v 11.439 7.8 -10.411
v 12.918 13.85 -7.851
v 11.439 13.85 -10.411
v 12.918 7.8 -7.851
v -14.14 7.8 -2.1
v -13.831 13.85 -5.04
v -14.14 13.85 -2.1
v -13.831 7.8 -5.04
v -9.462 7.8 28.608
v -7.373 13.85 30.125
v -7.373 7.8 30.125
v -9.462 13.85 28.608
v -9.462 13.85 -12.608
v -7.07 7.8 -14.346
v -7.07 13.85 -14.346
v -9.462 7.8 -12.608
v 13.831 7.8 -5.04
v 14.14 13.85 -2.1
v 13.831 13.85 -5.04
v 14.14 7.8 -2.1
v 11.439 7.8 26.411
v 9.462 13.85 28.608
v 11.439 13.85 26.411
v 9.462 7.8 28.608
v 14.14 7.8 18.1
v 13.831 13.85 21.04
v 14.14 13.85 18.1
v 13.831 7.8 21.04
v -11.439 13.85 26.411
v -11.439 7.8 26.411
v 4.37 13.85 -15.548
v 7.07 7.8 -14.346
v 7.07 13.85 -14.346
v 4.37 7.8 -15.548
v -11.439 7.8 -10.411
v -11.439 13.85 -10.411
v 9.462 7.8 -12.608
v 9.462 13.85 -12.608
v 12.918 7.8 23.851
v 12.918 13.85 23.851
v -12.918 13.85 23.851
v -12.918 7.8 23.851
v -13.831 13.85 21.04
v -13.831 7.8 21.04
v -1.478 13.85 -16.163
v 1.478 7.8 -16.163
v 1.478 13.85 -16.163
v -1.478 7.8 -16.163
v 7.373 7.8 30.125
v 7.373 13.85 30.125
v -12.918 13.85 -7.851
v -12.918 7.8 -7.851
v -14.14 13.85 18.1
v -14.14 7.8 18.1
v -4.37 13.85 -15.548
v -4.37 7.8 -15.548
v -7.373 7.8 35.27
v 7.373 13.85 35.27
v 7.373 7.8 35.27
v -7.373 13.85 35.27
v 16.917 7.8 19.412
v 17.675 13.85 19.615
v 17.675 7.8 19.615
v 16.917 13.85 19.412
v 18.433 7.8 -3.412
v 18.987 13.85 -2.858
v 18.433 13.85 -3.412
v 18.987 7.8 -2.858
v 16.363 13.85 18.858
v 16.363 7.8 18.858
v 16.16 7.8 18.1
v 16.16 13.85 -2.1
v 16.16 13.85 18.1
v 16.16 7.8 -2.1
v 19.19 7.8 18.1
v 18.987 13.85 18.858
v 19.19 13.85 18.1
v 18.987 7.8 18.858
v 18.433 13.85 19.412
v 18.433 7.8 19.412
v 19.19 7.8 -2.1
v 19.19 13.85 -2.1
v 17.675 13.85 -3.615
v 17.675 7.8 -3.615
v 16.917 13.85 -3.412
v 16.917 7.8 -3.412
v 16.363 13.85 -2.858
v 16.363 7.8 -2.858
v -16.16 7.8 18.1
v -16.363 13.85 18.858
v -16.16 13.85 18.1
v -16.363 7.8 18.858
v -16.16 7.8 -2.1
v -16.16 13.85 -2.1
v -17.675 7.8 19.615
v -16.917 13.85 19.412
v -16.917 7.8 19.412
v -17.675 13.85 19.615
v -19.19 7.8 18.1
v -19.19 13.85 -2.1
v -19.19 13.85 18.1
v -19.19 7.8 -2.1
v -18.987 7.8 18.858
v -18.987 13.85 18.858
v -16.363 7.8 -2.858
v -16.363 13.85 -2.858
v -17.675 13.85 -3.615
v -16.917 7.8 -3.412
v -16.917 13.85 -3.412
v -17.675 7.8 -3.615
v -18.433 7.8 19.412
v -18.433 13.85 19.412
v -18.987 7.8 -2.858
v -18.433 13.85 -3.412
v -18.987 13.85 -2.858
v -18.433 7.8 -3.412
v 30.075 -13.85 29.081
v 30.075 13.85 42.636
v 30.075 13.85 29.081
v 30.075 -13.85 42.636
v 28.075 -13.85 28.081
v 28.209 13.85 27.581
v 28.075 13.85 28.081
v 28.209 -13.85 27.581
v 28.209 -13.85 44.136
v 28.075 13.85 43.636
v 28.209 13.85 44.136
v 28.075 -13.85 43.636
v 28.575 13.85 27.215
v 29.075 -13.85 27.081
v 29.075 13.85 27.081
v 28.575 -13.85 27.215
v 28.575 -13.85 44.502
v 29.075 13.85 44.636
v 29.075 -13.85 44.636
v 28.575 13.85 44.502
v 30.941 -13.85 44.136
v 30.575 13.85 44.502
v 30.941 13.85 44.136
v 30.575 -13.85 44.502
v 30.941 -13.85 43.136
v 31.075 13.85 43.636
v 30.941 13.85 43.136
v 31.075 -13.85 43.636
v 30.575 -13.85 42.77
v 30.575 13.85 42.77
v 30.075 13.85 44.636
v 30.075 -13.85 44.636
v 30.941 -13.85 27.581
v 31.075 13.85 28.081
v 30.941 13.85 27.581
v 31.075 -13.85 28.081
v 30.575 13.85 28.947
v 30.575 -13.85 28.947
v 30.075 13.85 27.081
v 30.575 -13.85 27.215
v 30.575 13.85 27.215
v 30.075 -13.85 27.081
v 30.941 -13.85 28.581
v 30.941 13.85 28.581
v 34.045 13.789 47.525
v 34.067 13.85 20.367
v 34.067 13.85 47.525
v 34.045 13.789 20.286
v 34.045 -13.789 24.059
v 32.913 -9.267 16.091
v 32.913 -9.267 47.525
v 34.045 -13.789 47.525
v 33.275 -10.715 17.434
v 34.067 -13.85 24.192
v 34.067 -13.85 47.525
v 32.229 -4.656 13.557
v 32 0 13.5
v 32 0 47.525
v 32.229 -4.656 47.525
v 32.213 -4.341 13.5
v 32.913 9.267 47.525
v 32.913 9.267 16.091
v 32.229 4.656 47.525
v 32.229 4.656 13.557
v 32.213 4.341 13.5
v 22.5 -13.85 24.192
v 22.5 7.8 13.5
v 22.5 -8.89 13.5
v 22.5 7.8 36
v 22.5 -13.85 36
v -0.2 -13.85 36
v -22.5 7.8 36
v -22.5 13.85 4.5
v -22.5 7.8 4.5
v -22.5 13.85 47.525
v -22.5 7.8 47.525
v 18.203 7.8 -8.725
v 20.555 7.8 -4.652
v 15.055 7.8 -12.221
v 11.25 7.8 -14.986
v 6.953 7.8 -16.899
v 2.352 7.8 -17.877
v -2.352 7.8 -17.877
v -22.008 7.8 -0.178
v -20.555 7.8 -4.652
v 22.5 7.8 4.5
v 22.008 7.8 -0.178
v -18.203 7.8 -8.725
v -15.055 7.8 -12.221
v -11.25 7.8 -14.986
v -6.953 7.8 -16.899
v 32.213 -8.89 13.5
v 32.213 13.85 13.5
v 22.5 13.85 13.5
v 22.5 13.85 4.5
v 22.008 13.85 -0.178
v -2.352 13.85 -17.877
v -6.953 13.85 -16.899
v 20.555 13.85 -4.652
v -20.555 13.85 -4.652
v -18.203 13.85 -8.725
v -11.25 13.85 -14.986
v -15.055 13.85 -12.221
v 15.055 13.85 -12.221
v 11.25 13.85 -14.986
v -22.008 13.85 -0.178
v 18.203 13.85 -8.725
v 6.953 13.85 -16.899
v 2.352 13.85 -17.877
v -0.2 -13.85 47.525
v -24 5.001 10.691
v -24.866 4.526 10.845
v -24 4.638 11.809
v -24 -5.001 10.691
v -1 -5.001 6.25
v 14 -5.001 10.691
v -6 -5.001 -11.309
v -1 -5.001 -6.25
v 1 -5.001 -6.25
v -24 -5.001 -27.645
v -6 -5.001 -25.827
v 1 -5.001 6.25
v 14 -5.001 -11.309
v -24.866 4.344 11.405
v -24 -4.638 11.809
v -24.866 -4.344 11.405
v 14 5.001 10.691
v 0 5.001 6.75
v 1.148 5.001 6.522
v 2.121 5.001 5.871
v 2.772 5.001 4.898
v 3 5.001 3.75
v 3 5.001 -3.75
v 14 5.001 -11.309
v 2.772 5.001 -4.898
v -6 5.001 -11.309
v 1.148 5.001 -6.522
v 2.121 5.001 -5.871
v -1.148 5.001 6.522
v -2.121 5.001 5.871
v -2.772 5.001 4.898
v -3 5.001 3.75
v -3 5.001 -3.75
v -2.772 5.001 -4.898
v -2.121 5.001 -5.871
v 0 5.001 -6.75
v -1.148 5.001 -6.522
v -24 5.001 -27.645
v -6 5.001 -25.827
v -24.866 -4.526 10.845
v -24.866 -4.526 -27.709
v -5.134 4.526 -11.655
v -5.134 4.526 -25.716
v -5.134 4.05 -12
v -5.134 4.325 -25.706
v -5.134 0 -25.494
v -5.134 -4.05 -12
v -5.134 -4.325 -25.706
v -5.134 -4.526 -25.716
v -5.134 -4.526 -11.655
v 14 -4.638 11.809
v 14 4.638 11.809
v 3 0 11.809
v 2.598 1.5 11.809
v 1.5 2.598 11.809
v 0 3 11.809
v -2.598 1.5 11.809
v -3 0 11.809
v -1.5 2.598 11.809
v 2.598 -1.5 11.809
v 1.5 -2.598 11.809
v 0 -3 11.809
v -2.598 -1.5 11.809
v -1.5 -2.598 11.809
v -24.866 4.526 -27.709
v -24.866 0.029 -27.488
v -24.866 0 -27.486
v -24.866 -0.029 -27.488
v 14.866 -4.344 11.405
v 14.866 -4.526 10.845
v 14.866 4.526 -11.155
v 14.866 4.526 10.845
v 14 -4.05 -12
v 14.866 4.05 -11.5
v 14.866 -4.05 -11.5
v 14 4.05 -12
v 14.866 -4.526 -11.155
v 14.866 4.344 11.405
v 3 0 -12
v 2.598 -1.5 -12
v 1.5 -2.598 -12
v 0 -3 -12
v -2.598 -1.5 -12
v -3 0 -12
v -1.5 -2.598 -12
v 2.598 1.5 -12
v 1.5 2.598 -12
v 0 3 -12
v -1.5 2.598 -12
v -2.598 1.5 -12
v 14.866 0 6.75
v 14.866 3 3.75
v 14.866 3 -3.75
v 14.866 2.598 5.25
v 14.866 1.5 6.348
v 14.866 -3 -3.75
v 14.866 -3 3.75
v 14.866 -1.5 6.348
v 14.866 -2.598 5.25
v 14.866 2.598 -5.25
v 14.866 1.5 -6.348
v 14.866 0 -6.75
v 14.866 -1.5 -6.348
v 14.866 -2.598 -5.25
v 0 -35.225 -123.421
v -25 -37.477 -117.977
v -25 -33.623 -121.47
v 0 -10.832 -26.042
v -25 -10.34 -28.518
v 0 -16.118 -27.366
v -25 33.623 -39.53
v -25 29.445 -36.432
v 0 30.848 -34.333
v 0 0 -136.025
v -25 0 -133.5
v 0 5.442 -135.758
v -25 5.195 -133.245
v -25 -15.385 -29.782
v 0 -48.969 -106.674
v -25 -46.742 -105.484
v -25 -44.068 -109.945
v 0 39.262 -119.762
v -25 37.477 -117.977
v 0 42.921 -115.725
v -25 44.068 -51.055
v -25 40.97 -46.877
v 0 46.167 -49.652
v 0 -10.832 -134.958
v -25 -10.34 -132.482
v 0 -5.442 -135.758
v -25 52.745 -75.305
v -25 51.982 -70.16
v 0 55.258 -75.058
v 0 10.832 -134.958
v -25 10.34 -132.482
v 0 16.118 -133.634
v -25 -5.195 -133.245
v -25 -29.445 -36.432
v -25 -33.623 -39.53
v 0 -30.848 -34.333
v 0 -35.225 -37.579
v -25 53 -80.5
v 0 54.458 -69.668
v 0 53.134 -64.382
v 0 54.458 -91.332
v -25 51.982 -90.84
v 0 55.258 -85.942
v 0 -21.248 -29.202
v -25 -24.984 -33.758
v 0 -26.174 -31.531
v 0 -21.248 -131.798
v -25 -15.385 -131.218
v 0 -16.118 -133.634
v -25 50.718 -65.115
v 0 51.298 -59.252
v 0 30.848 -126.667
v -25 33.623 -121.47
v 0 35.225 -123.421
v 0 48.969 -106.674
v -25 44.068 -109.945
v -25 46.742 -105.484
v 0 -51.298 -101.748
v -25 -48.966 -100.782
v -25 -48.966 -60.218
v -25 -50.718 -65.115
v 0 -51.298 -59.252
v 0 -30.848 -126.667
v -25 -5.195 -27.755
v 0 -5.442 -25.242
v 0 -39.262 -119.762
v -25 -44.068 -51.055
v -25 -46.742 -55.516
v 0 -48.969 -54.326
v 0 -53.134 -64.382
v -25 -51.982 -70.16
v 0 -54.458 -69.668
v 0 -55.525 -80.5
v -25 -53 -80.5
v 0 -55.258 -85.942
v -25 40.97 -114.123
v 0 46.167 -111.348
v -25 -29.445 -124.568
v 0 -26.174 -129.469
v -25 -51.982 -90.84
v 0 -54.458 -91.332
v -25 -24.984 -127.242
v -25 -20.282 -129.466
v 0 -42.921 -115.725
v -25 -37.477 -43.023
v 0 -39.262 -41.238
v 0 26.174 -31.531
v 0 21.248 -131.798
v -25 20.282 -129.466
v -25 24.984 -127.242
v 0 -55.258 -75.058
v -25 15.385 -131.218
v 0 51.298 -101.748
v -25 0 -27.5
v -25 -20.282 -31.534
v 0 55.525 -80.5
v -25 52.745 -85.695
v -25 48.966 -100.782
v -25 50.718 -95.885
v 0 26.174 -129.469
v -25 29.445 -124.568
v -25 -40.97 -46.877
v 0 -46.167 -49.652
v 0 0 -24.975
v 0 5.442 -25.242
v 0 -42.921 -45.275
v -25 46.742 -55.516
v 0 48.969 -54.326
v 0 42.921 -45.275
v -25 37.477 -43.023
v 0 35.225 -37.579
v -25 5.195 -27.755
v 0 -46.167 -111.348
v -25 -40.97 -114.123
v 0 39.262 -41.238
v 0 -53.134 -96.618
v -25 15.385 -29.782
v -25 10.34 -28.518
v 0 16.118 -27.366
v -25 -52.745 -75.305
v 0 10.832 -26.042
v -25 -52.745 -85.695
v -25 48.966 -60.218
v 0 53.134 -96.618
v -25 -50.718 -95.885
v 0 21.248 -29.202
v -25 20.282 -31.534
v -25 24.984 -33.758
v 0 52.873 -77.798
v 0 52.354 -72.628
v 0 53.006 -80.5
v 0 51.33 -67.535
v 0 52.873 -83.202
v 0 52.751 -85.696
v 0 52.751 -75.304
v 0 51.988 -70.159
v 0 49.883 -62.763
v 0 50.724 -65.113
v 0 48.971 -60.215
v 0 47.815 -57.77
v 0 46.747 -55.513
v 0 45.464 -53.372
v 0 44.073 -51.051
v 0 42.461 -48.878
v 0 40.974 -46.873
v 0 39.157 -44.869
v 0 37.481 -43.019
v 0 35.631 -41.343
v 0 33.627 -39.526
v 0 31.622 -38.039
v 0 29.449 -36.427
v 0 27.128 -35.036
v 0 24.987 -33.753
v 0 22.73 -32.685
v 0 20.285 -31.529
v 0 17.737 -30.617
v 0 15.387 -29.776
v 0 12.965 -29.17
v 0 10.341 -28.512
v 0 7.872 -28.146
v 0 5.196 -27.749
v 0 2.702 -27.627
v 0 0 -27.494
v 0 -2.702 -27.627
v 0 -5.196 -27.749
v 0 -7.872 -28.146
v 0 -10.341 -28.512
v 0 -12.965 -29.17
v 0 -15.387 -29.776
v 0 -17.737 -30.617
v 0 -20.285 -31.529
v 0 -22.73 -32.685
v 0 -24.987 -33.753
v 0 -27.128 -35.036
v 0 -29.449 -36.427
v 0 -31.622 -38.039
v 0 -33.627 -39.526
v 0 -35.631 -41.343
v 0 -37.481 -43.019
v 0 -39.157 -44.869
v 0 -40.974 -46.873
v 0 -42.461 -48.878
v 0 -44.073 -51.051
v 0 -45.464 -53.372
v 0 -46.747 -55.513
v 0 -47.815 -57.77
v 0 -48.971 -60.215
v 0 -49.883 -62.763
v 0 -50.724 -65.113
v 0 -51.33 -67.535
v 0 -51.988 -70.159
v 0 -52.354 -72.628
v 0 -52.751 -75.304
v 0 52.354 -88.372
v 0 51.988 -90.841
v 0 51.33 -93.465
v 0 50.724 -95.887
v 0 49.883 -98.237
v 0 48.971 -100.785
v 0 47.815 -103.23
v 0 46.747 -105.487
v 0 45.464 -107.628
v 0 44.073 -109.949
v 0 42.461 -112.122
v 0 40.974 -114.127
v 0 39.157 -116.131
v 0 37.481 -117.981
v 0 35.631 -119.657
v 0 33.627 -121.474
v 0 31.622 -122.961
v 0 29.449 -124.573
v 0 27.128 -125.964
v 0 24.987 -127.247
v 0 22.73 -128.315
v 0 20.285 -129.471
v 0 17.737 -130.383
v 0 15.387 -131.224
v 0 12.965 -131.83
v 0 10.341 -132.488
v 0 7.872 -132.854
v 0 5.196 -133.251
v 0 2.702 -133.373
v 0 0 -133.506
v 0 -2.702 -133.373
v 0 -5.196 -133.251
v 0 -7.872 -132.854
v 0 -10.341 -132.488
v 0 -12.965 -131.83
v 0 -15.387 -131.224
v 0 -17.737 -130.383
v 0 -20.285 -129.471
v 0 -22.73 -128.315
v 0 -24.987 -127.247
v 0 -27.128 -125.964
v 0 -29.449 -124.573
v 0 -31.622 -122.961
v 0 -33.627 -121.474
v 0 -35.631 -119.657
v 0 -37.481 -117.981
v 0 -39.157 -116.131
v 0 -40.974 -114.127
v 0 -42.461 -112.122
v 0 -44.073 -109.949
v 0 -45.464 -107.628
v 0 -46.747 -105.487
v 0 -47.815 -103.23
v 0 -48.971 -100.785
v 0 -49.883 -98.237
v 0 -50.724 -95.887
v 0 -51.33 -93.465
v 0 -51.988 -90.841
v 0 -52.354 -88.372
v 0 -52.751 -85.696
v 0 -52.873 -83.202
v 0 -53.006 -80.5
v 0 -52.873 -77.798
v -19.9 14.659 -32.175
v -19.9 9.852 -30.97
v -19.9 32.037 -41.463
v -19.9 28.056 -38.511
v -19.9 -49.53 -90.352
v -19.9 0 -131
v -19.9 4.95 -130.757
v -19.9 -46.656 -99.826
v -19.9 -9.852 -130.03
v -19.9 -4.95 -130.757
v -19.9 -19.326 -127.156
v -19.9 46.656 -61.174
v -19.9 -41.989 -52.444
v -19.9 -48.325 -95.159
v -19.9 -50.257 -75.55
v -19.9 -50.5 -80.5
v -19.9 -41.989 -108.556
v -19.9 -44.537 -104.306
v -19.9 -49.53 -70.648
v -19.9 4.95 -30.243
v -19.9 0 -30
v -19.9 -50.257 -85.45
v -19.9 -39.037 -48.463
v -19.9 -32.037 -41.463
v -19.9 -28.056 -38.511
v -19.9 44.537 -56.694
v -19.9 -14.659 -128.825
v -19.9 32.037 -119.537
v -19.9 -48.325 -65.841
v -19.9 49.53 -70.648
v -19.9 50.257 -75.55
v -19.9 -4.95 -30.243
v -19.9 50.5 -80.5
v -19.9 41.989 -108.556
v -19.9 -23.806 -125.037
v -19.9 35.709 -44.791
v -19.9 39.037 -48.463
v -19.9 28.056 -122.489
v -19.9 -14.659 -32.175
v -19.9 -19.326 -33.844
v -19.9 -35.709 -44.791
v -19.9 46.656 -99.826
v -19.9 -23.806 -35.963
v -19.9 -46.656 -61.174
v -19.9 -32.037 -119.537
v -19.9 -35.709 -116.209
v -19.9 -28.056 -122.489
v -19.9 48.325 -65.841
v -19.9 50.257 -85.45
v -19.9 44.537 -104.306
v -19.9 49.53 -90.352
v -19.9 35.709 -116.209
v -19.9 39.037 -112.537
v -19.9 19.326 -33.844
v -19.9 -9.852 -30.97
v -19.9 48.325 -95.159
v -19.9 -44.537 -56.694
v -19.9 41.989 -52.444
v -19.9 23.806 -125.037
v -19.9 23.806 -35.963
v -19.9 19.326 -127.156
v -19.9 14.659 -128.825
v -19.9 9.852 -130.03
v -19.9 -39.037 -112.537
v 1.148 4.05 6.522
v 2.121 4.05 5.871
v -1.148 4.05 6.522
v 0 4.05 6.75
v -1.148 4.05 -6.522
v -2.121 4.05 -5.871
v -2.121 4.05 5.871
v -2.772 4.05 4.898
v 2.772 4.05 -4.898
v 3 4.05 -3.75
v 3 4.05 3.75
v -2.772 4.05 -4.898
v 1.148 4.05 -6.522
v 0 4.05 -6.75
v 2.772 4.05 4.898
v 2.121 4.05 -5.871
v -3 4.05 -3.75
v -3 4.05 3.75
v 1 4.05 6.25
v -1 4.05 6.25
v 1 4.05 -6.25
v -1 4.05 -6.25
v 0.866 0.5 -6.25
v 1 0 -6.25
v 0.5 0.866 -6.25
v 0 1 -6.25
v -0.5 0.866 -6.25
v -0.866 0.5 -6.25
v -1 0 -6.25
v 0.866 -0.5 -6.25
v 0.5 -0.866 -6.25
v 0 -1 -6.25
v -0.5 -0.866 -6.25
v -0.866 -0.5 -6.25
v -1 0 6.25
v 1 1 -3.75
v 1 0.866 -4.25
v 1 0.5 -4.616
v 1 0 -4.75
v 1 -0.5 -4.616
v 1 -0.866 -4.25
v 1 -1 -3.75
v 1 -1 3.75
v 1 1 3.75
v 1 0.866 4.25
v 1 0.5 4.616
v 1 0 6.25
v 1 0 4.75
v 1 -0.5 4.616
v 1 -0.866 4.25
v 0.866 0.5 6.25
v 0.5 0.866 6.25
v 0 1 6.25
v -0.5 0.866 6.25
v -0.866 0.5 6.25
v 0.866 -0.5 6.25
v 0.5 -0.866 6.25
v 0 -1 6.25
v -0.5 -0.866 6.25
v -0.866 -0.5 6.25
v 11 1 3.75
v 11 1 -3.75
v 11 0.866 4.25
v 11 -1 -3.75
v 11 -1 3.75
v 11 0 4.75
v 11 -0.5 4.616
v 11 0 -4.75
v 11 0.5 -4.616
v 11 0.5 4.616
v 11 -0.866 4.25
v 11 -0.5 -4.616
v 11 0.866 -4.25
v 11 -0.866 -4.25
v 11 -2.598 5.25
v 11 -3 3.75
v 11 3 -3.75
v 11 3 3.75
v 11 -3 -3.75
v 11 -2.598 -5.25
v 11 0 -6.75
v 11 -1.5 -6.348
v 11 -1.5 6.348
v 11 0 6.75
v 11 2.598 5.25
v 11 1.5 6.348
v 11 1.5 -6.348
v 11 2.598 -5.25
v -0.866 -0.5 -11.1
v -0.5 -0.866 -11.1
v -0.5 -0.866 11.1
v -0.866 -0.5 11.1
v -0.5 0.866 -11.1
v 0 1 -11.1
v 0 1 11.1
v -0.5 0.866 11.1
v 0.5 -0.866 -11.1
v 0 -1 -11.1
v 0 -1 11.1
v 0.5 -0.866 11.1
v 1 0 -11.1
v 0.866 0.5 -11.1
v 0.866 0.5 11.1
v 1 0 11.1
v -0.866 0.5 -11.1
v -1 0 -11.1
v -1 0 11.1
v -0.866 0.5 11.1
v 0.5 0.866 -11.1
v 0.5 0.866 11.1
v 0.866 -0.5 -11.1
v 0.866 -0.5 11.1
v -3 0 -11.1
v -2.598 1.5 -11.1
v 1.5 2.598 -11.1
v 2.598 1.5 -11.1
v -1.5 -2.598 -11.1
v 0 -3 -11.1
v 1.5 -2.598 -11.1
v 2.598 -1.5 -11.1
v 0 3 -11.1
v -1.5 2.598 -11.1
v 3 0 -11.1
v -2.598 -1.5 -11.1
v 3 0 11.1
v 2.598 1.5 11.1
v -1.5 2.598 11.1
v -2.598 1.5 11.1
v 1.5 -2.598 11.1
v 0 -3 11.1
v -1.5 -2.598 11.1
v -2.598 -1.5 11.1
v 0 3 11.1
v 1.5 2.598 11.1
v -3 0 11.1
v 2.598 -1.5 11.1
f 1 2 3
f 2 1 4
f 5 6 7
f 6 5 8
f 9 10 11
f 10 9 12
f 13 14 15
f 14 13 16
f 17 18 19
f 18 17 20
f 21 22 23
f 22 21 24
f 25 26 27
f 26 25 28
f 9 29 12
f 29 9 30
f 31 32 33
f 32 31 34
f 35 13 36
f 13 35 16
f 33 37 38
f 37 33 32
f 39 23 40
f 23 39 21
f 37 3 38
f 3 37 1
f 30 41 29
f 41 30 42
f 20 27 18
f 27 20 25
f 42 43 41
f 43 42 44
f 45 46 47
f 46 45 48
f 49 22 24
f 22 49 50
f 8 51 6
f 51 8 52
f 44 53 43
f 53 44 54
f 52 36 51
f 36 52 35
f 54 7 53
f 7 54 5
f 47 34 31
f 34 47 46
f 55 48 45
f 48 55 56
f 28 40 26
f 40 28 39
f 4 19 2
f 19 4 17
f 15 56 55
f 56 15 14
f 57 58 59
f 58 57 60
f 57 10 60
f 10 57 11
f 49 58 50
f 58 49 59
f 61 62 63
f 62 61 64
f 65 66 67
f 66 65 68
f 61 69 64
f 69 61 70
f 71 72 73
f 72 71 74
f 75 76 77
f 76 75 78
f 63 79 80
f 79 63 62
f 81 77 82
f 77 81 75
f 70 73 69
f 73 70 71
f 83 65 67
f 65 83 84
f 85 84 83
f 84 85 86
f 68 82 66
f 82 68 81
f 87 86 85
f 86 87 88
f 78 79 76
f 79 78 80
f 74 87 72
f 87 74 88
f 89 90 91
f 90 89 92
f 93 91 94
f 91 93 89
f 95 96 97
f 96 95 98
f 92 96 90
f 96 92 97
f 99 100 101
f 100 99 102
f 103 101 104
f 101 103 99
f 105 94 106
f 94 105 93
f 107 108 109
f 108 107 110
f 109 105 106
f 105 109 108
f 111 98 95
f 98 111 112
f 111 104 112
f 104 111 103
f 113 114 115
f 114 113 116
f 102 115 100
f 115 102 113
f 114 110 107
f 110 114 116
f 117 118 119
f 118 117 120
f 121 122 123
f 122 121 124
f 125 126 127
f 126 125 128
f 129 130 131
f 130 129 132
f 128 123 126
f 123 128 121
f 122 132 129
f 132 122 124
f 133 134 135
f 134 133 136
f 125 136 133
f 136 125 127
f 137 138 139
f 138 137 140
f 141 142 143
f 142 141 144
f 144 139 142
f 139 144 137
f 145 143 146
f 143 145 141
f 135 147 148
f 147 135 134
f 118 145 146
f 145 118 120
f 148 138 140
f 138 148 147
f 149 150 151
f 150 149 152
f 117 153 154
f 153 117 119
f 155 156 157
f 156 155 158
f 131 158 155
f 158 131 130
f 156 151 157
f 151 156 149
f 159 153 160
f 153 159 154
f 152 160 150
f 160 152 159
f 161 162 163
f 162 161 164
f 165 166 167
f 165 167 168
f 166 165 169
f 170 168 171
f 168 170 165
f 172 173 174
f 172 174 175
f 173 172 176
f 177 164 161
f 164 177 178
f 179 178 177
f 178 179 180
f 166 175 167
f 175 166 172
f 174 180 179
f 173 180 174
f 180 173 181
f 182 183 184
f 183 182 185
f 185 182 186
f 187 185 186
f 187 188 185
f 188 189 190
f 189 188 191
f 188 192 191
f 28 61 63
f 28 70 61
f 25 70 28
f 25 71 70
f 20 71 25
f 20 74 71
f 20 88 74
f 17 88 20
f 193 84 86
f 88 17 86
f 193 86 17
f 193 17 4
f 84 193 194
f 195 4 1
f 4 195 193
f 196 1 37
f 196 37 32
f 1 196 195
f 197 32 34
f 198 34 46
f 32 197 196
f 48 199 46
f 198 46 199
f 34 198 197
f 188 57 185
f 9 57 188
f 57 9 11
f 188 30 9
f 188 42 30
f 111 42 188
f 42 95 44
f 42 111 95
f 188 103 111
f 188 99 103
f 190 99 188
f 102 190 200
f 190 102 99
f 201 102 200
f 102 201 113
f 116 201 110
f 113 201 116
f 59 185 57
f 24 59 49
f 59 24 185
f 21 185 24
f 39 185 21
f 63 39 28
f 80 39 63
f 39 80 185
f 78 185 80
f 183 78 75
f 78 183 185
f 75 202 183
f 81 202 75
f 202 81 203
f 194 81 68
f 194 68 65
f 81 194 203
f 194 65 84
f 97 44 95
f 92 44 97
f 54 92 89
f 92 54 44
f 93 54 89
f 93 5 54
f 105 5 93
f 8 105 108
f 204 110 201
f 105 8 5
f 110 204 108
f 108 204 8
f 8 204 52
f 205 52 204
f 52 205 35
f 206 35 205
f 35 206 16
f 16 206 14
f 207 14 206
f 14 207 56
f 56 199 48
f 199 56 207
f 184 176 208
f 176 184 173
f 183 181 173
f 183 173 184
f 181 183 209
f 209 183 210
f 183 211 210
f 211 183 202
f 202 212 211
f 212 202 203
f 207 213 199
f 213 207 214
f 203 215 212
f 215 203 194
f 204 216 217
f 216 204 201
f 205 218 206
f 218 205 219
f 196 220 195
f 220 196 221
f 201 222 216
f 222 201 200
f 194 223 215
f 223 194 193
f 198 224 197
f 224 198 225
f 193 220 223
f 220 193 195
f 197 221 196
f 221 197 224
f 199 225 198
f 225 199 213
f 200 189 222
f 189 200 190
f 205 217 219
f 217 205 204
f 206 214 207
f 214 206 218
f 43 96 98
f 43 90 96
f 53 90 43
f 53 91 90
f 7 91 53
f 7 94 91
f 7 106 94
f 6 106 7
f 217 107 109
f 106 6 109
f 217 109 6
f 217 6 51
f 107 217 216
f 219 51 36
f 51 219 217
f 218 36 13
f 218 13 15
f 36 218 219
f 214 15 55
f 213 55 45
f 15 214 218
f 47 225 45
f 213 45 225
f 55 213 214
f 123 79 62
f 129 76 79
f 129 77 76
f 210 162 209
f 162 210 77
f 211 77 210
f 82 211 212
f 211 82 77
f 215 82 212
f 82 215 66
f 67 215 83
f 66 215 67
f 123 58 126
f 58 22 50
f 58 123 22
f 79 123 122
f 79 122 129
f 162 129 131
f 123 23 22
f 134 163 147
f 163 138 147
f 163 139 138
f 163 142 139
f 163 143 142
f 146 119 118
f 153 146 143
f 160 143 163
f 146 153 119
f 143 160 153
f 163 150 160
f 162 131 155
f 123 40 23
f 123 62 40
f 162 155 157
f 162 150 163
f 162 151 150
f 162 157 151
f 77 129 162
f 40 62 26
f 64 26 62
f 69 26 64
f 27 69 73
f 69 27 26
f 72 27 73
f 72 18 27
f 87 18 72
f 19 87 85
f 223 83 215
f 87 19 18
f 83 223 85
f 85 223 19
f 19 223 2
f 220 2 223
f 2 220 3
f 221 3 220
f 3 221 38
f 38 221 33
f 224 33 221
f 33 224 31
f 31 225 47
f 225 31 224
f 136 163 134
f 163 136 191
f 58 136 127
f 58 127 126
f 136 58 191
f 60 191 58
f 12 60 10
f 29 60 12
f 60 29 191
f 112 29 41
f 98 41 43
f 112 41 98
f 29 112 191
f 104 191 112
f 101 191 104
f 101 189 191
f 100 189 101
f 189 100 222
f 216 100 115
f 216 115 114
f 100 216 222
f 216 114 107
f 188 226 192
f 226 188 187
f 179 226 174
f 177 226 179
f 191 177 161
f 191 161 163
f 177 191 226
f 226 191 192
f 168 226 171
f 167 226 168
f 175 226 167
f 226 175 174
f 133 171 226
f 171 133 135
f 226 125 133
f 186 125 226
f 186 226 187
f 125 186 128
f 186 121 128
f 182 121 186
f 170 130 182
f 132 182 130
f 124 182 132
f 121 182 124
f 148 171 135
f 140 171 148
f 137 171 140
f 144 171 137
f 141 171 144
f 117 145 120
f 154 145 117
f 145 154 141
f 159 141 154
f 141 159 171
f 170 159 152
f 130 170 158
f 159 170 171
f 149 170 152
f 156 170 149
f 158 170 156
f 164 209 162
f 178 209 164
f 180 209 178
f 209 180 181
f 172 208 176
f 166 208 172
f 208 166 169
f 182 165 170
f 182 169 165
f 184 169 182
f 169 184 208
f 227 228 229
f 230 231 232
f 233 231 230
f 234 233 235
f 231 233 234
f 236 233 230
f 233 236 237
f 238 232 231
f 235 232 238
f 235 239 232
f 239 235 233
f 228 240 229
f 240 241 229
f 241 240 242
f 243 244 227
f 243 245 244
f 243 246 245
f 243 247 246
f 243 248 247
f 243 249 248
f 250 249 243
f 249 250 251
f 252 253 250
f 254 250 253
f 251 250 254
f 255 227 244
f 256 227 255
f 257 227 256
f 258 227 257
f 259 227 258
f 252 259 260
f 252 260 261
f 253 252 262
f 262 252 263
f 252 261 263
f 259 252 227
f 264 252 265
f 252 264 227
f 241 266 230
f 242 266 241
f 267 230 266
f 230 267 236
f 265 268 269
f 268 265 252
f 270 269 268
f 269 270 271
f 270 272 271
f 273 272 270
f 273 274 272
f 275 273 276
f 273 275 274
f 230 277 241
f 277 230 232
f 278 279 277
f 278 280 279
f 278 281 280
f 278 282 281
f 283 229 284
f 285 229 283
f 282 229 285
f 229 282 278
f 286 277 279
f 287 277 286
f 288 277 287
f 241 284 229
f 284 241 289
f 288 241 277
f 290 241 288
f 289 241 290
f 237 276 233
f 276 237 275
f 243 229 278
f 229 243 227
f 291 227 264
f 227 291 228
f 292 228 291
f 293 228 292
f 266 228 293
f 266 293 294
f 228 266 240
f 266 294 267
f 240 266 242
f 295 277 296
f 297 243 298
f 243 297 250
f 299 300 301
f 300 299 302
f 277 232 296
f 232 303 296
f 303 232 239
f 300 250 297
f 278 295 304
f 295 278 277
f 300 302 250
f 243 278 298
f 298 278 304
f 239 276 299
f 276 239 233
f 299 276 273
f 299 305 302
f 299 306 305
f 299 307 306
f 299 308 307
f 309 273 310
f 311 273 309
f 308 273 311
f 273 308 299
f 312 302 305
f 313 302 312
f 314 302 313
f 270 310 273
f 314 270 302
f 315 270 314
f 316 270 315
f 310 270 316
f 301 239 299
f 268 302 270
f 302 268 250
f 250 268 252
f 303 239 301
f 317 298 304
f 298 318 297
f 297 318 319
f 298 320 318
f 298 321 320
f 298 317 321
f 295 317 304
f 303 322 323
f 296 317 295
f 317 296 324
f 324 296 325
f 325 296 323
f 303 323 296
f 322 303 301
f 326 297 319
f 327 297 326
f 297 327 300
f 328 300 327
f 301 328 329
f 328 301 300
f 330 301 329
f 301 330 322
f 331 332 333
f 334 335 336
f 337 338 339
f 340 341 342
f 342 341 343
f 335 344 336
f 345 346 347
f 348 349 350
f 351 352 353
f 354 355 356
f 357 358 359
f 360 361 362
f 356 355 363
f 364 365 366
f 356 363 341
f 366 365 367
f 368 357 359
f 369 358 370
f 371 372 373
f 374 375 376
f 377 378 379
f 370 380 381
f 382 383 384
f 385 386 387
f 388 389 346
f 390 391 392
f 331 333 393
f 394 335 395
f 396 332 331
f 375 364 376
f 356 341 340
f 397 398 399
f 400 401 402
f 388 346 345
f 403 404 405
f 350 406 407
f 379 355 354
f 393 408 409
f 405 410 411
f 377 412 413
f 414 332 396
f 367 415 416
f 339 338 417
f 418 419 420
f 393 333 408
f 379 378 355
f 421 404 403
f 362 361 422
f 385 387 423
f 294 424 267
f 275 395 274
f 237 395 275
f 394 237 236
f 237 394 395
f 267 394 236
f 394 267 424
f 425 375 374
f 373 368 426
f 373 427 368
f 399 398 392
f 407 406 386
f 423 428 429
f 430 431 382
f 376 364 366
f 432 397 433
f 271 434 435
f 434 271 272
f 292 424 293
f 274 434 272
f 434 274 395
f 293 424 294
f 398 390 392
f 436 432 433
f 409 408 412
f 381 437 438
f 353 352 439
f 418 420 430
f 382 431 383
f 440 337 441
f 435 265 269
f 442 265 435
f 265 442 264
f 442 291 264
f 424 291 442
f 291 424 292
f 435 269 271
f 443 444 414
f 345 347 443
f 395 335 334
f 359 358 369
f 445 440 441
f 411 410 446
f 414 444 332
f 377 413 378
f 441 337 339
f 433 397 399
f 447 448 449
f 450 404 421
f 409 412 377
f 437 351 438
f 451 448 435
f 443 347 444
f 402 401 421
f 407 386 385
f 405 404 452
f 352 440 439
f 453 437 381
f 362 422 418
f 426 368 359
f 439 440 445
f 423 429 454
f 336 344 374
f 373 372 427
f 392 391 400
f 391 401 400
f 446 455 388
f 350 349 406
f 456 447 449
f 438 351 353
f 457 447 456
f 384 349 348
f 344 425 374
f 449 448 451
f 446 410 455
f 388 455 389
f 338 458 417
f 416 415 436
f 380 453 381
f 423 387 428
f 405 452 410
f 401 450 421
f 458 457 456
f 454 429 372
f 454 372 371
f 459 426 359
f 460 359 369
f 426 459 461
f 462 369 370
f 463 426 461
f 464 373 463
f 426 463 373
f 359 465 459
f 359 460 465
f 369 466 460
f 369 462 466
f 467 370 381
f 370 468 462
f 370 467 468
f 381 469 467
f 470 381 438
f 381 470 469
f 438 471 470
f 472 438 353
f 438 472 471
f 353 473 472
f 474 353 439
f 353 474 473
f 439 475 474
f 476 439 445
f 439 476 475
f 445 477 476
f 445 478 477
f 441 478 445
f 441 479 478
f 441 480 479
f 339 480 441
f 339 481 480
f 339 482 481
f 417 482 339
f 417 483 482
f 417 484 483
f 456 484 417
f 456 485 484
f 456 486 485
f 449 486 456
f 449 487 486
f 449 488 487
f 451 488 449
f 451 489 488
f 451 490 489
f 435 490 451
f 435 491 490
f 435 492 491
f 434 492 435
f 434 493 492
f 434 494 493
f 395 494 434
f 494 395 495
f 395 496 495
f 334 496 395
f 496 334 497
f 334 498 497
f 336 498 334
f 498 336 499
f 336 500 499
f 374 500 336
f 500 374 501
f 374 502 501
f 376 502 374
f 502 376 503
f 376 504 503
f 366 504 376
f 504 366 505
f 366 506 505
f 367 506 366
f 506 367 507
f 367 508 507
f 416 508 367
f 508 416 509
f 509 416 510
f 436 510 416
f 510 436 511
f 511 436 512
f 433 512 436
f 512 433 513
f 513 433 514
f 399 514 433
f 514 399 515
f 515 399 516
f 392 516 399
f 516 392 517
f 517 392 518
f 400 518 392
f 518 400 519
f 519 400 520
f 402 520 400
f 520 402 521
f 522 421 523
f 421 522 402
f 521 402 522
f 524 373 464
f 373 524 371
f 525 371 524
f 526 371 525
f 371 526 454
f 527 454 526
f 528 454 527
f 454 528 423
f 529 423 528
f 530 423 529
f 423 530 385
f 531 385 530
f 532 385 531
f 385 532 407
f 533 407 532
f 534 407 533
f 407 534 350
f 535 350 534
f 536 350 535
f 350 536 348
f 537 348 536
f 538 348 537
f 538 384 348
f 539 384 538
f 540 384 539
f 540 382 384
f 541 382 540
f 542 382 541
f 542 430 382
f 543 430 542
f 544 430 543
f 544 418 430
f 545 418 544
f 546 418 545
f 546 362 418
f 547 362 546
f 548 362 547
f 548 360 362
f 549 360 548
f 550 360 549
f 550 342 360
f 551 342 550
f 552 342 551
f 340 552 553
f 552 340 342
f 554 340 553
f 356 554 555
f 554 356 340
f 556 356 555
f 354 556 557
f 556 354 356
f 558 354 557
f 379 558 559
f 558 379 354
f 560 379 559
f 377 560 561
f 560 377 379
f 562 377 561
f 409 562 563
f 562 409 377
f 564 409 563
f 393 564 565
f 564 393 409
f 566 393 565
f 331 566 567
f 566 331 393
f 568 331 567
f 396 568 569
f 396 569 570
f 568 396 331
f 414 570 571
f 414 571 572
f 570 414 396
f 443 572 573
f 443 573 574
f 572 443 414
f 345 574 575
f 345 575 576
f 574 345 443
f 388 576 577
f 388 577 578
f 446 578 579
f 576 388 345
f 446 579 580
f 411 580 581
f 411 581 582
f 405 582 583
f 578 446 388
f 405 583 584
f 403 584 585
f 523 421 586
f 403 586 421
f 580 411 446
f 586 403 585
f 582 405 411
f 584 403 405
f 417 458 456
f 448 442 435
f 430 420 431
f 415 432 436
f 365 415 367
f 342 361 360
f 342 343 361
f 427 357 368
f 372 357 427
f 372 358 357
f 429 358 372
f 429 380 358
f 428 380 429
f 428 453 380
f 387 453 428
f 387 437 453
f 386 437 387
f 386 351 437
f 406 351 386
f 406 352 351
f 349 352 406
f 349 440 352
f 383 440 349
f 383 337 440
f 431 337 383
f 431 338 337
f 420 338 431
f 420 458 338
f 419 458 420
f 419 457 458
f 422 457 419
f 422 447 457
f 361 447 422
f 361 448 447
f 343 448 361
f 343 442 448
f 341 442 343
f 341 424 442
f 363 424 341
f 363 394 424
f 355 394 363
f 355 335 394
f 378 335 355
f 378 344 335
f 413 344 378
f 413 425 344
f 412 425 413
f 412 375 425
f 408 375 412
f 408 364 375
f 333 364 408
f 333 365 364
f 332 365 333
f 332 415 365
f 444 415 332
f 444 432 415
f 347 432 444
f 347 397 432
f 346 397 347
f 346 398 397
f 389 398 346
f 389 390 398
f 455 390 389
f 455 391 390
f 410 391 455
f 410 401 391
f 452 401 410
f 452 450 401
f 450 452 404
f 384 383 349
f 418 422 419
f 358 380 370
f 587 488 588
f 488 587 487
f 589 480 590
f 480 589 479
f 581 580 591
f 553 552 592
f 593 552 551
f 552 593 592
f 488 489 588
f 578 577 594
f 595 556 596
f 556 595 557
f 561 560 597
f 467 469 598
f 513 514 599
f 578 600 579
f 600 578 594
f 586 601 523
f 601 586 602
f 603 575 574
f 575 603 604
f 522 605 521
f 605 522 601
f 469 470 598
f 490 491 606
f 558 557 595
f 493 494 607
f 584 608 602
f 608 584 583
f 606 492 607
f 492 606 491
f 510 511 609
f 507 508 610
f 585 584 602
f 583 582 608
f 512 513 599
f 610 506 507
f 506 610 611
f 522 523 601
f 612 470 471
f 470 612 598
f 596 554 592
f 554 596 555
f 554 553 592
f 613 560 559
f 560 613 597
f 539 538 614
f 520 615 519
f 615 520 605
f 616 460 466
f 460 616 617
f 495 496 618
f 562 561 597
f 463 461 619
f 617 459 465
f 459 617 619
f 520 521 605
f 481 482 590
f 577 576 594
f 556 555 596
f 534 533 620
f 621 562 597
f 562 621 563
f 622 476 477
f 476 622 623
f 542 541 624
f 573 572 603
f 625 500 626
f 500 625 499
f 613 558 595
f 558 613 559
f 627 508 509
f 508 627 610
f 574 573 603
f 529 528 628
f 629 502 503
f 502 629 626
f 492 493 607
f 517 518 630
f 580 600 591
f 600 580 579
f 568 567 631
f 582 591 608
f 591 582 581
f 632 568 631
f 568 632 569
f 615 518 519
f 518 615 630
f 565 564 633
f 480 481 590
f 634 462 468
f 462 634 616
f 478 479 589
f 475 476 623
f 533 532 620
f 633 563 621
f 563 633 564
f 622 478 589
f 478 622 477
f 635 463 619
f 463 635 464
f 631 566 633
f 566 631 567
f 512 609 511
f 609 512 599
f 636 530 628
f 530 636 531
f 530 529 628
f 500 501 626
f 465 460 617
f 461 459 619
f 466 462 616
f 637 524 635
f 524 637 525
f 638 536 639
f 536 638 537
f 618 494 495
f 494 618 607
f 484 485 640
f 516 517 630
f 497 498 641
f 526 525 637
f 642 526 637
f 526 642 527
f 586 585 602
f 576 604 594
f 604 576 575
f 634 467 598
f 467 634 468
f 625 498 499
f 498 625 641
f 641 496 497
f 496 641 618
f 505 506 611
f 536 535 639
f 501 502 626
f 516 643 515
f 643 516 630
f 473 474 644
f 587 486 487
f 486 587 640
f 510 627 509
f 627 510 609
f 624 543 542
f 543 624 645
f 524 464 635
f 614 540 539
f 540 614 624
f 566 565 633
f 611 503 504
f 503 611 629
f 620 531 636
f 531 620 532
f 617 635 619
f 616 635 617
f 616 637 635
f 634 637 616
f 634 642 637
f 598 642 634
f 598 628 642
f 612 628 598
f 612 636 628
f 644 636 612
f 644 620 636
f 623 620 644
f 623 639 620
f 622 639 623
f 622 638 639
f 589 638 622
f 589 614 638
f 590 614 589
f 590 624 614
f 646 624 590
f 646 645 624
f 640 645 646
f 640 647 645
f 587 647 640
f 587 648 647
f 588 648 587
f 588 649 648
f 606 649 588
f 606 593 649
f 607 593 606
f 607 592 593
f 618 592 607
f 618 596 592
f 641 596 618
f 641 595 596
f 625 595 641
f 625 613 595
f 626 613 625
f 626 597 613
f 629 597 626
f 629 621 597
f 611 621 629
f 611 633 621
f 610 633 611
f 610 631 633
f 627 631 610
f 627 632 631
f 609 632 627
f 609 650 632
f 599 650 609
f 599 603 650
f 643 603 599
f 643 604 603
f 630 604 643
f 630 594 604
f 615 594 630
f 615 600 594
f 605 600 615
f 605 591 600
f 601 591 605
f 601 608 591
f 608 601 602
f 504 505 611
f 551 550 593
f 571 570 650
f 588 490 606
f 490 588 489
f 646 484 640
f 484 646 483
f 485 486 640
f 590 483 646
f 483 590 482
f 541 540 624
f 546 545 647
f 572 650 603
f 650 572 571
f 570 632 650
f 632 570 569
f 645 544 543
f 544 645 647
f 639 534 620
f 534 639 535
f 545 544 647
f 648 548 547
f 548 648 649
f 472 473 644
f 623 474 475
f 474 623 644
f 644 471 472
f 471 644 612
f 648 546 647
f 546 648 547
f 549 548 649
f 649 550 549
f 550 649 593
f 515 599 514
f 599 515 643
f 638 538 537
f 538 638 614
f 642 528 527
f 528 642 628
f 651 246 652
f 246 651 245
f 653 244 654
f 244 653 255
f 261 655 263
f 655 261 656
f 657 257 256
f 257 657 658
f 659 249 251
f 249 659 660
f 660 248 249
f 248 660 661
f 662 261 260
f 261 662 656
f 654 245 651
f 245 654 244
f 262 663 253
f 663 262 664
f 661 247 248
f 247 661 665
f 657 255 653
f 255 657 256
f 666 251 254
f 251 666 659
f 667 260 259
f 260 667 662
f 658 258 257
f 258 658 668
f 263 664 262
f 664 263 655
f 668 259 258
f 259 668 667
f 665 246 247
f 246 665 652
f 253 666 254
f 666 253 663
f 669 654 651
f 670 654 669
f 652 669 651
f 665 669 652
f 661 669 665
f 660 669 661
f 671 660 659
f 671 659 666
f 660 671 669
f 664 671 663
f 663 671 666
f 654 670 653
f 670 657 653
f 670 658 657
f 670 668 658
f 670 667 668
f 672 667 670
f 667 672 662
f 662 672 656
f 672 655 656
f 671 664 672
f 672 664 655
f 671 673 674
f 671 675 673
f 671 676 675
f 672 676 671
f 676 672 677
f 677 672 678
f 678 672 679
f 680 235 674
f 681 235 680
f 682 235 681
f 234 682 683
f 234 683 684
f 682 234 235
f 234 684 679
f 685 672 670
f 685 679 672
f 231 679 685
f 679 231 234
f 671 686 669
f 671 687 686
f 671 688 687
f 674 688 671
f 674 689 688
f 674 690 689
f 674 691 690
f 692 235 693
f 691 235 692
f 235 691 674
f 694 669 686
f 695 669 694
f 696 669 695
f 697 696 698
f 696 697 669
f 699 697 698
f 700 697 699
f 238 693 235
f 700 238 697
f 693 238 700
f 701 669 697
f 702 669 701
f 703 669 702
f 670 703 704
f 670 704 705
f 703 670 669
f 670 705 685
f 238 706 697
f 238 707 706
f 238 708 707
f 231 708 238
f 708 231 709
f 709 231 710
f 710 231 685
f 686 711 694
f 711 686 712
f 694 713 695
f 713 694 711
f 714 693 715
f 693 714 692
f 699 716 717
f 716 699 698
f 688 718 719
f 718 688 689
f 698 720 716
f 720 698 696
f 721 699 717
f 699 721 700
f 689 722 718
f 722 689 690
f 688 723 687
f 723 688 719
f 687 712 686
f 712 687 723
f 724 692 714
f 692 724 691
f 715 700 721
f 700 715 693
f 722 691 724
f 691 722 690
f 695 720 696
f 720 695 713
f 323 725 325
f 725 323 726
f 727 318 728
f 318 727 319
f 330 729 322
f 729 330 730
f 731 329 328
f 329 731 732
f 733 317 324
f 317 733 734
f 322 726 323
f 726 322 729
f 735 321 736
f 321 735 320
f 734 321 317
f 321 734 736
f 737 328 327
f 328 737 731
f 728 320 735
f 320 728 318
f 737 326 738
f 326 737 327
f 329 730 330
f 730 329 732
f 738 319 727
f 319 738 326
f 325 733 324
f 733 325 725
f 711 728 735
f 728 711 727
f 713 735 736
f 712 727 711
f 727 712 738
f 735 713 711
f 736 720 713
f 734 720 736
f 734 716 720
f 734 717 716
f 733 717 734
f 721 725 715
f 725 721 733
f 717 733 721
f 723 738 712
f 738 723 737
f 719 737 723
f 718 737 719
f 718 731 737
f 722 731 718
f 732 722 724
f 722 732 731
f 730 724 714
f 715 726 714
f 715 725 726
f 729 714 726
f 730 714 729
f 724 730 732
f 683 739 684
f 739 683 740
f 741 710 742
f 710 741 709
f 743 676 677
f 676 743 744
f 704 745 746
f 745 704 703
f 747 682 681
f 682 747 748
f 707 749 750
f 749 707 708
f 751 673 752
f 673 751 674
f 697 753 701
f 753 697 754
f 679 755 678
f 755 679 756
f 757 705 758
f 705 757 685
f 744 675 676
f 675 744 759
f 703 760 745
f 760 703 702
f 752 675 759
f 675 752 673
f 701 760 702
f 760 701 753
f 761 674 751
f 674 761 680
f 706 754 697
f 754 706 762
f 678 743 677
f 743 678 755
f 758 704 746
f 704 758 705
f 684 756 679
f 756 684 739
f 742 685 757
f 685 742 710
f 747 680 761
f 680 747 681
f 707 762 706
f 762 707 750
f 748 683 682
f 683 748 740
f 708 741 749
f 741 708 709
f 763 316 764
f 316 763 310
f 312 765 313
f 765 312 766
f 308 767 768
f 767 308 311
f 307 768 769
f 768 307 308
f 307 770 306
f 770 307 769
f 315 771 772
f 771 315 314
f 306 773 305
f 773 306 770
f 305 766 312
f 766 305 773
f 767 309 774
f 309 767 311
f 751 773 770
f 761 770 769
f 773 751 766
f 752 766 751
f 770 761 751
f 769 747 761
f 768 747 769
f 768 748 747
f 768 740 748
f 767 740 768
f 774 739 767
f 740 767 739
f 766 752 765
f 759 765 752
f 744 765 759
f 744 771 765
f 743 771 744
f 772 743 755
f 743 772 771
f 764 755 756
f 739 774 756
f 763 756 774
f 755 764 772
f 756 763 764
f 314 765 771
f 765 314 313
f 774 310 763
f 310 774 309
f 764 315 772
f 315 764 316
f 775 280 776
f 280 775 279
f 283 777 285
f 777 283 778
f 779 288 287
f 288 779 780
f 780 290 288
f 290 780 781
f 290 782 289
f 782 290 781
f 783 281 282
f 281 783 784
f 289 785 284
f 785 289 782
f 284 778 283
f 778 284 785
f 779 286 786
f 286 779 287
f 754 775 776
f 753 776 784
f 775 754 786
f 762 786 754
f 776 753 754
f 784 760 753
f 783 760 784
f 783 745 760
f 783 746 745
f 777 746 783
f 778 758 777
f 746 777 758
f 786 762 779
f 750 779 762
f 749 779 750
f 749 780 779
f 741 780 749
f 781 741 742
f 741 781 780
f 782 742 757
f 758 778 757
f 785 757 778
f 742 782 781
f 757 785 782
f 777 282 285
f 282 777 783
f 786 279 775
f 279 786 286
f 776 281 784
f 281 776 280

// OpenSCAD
// file: 28byj-48.scad
module body()
{
    union()
    {
        cylinder(h = 19, d = 28, center = [0,0,0]);
        translate([-14.6/2,-17,19-16]) cube([14.6,17,16]);
    }
}

module ear()
{
    translate([-35/2,0,19-0.8/2])
    {
        difference()
        {
            union()
            {
                cylinder(h=0.8, d=7, center=true);
                translate([0,-7/2,-0.8/2])
                {
                    cube([7,7,0.8]);
                }
            }
            cylinder(h=0.8+0.1, d=4.2, center=true);
        }
    }
}

module axis()
{
    translate([0,8,19])
    {
        cylinder(h=1.5, d=9);
        difference()
        {
            cylinder(h=10, d=5);
            #translate([-3,(+5-3)/2,4]) cube([3*2,2,6]);
            #translate([-3,(-5+3)/2-2,4]) cube([3*2,2,6]);
        }
    }
}

module stepper_28BYJ_48()
{
    body();
    ear();
    mirror(v=[-1,0,0]) ear();
    axis();
}

stepper_28BYJ_48();
// main file
// Dust cap system

lens_r=101/2;

use <28byj-48.scad>;
M3_d=3; // 2.5 is printed too narrow
M2_d=1.6*(3/2.5); // 1.6 enlarged in same proportions
M3_Head=2;

module ED80T()
{
    cylinder(d=101,h=20,$fn=64);
    cylinder(d=101-3*2,h=100,$fn=64);
}

module offset_hull(ofs=[0,0,0])
{
    // Works with 1-level deep objects...
    for(c=[0:$children-1])
        hull()
        {
            translate(-ofs) children(c);
            translate( ofs) children(c);
        }
}

module screw_space(head_d,head_h,drill_d,drill_h,hull_ofs=[0,0,0])
{
    offset_hull(hull_ofs)
    {
        cylinder(d=head_d,h=drill_h,$fn=12);
        translate([0,0,drill_h-1])
            cylinder(d=drill_d*2.0,h=head_h,$fn=12);
    }
}

lever_l=30;
module cap_block(R,H,B) union()
{
    bot_h=5;
    lever_w=0+R*0.2;
    lever_drop=0+H;
    m_r=1;
    difference()
    {
        translate([lever_l+R,0,-bot_h-lever_drop]) difference()
        {
            union()
            {
                cylinder(h=H+bot_h,d1=R*2+5,d2=R*2.1+5,$fn=64);
                minkowski()
                {
                    translate([-R-lever_l/2,0,10]) //hull()
                    {
                        cube([lever_l*1.8-m_r*2,lever_w-m_r*2,H-m_r*2],center=true);
                        //translate([0,0,-H/2+5/2])
                        //    cube([lever_l,lever_w*1.5,5],center=true);
                        translate([-lever_l/2,0,H-5])
                            cube([lever_l*0.8-m_r*2,lever_w-m_r*2,H+10-m_r*2],center=true);
                    }
                    sphere(d=m_r*2);
                }
            }
            // Cap emptiness
            translate([0,0,bot_h+0.1]) union()
            {
                cylinder(h=2*H+0.1,d1=R*2,d2=R*2.2,$fn=64);
                /*translate([0,0,H])
                    cylinder(h=H,d=R*2.1);*/
            }
        }
        // Stepper axis
        *rotate([0,180,0]) translate([0,24+M3_Head,-8])
            rotate([90,0,0])
                stepper_28BYJ_48();
        #translate([0,lever_w/2+0,0])
            rotate([90,0,0])
                offset_hull([lever_l/8,0,0])
                {
                    cylinder(d=6,h=1,$fn=16);
                    translate([0,0,lever_w/2])
                        cube([5,2,lever_w],center=true);
                }
        // Screws with space for head and adjustment
        #union()
        {
            screw_space(M3_Head,4,M3_d,H/2+2,[lever_l/8,0,0]);
            rotate([0,90,0]) screw_space(M3_Head,4,M3_d,lever_w+2);
            rotate([0,-90,0]) screw_space(M3_Head,4,M3_d,lever_w+2);
        }
    }
}

module holder(R,H,B)
{
    holder_w=0+R*0.1;
    holder_h=70;
    holder_d=45;
    stepper_ear_h=0.8;
    side_offset=5.5+holder_w/2+M3_Head+stepper_ear_h;
    difference()
    {
        hull()
        {
            translate([0,side_offset,holder_w/2+10])
                cube([holder_d,1+holder_w,holder_h],center=true);
            /*translate([0,-side_offset,holder_w/2+10])
                cube([holder_d,1+holder_w,holder_h],center=true);*/
            translate([holder_d/2-holder_w,0,holder_w/2+10+holder_h/3])
                cube([holder_w*6+5,1+holder_w+2*side_offset,holder_h/3],center=true);
        }
        %rotate([0,180,0])
            translate([0,24+M3_Head,-8])
                rotate([90,0,0])
                    stepper_28BYJ_48();
        translate([0,0,8]) scale([1,5,1])
            rotate([90,180,0]) scale(1.01) offset_hull([0,10,0])
            {
                // Stepper space
                cylinder(h=holder_w+stepper_ear_h+1,d=28,center=true);
                translate([-14.6/2,-17,-(holder_w+stepper_ear_h+1)/2])
                    cube([14.6,17,holder_w+stepper_ear_h+1]);
                // Stepper screws
                translate([-35/2,0,0])
                    cylinder(d=M3_d,h=holder_w+stepper_ear_h+1,center=true,$fn=12);
                translate([+35/2,0,0])
                    cylinder(d=M3_d,h=holder_w+stepper_ear_h+1,center=true,$fn=12);
            }
        #translate([holder_d/2+holder_w*6/4-1,0,holder_w/2+10+holder_h/3])
            rotate([90,0,0])
            {
                offset_hull([0,holder_h/9,0])
                    cylinder(d=2,h=holder_w*7,center=true,$fn=12);
                translate([1/2,holder_h/9,0])
                    offset_hull([1/2,0,0])
                        cylinder(d=2,h=holder_w*7,center=true,$fn=12);
                translate([1/2,-holder_h/9,0])
                    offset_hull([1/2,0,0])
                        cylinder(d=2,h=holder_w*7,center=true,$fn=12);
            }
        translate([lever_l+lens_r-1,0,-20])
            ED80T();
        translate([0,side_offset-holder_w/2-31/2,1])
        {
            cube([holder_d,30,holder_h],center=true);
            translate([20,0,-5])
                cube([holder_d,30,holder_h/2],center=true);
            translate([holder_d,holder_w*2,-5])
                cube([holder_d,30,holder_h/2],center=true);
        }
        // Argh, leave space for cap!
        translate([0,0,-18+holder_d/2])
            rotate([90,0,0])
                difference()
                {
                    cylinder(d=holder_d*1.6,h=(side_offset+holder_w)*2,center=true);
                    cylinder(d=holder_d*1.0,h=1+(side_offset+holder_w)*2,center=true);
                    translate([0,(1.6*holder_d)/4,0])
                        cube([holder_d*1.6,1.6*holder_d/2,1+(side_offset+holder_w)*2],center=true);
                }
            //cube([holder_d+5,30,holder_h/2],center=true);
    }
}

%translate([lever_l+lens_r,0,-20]) ED80T();
holder(lens_r,20,50);
//rotate([0,180-180*sin(180*$t),0])
rotate([0,90,0])
    cap_block(lens_r,20,50);
